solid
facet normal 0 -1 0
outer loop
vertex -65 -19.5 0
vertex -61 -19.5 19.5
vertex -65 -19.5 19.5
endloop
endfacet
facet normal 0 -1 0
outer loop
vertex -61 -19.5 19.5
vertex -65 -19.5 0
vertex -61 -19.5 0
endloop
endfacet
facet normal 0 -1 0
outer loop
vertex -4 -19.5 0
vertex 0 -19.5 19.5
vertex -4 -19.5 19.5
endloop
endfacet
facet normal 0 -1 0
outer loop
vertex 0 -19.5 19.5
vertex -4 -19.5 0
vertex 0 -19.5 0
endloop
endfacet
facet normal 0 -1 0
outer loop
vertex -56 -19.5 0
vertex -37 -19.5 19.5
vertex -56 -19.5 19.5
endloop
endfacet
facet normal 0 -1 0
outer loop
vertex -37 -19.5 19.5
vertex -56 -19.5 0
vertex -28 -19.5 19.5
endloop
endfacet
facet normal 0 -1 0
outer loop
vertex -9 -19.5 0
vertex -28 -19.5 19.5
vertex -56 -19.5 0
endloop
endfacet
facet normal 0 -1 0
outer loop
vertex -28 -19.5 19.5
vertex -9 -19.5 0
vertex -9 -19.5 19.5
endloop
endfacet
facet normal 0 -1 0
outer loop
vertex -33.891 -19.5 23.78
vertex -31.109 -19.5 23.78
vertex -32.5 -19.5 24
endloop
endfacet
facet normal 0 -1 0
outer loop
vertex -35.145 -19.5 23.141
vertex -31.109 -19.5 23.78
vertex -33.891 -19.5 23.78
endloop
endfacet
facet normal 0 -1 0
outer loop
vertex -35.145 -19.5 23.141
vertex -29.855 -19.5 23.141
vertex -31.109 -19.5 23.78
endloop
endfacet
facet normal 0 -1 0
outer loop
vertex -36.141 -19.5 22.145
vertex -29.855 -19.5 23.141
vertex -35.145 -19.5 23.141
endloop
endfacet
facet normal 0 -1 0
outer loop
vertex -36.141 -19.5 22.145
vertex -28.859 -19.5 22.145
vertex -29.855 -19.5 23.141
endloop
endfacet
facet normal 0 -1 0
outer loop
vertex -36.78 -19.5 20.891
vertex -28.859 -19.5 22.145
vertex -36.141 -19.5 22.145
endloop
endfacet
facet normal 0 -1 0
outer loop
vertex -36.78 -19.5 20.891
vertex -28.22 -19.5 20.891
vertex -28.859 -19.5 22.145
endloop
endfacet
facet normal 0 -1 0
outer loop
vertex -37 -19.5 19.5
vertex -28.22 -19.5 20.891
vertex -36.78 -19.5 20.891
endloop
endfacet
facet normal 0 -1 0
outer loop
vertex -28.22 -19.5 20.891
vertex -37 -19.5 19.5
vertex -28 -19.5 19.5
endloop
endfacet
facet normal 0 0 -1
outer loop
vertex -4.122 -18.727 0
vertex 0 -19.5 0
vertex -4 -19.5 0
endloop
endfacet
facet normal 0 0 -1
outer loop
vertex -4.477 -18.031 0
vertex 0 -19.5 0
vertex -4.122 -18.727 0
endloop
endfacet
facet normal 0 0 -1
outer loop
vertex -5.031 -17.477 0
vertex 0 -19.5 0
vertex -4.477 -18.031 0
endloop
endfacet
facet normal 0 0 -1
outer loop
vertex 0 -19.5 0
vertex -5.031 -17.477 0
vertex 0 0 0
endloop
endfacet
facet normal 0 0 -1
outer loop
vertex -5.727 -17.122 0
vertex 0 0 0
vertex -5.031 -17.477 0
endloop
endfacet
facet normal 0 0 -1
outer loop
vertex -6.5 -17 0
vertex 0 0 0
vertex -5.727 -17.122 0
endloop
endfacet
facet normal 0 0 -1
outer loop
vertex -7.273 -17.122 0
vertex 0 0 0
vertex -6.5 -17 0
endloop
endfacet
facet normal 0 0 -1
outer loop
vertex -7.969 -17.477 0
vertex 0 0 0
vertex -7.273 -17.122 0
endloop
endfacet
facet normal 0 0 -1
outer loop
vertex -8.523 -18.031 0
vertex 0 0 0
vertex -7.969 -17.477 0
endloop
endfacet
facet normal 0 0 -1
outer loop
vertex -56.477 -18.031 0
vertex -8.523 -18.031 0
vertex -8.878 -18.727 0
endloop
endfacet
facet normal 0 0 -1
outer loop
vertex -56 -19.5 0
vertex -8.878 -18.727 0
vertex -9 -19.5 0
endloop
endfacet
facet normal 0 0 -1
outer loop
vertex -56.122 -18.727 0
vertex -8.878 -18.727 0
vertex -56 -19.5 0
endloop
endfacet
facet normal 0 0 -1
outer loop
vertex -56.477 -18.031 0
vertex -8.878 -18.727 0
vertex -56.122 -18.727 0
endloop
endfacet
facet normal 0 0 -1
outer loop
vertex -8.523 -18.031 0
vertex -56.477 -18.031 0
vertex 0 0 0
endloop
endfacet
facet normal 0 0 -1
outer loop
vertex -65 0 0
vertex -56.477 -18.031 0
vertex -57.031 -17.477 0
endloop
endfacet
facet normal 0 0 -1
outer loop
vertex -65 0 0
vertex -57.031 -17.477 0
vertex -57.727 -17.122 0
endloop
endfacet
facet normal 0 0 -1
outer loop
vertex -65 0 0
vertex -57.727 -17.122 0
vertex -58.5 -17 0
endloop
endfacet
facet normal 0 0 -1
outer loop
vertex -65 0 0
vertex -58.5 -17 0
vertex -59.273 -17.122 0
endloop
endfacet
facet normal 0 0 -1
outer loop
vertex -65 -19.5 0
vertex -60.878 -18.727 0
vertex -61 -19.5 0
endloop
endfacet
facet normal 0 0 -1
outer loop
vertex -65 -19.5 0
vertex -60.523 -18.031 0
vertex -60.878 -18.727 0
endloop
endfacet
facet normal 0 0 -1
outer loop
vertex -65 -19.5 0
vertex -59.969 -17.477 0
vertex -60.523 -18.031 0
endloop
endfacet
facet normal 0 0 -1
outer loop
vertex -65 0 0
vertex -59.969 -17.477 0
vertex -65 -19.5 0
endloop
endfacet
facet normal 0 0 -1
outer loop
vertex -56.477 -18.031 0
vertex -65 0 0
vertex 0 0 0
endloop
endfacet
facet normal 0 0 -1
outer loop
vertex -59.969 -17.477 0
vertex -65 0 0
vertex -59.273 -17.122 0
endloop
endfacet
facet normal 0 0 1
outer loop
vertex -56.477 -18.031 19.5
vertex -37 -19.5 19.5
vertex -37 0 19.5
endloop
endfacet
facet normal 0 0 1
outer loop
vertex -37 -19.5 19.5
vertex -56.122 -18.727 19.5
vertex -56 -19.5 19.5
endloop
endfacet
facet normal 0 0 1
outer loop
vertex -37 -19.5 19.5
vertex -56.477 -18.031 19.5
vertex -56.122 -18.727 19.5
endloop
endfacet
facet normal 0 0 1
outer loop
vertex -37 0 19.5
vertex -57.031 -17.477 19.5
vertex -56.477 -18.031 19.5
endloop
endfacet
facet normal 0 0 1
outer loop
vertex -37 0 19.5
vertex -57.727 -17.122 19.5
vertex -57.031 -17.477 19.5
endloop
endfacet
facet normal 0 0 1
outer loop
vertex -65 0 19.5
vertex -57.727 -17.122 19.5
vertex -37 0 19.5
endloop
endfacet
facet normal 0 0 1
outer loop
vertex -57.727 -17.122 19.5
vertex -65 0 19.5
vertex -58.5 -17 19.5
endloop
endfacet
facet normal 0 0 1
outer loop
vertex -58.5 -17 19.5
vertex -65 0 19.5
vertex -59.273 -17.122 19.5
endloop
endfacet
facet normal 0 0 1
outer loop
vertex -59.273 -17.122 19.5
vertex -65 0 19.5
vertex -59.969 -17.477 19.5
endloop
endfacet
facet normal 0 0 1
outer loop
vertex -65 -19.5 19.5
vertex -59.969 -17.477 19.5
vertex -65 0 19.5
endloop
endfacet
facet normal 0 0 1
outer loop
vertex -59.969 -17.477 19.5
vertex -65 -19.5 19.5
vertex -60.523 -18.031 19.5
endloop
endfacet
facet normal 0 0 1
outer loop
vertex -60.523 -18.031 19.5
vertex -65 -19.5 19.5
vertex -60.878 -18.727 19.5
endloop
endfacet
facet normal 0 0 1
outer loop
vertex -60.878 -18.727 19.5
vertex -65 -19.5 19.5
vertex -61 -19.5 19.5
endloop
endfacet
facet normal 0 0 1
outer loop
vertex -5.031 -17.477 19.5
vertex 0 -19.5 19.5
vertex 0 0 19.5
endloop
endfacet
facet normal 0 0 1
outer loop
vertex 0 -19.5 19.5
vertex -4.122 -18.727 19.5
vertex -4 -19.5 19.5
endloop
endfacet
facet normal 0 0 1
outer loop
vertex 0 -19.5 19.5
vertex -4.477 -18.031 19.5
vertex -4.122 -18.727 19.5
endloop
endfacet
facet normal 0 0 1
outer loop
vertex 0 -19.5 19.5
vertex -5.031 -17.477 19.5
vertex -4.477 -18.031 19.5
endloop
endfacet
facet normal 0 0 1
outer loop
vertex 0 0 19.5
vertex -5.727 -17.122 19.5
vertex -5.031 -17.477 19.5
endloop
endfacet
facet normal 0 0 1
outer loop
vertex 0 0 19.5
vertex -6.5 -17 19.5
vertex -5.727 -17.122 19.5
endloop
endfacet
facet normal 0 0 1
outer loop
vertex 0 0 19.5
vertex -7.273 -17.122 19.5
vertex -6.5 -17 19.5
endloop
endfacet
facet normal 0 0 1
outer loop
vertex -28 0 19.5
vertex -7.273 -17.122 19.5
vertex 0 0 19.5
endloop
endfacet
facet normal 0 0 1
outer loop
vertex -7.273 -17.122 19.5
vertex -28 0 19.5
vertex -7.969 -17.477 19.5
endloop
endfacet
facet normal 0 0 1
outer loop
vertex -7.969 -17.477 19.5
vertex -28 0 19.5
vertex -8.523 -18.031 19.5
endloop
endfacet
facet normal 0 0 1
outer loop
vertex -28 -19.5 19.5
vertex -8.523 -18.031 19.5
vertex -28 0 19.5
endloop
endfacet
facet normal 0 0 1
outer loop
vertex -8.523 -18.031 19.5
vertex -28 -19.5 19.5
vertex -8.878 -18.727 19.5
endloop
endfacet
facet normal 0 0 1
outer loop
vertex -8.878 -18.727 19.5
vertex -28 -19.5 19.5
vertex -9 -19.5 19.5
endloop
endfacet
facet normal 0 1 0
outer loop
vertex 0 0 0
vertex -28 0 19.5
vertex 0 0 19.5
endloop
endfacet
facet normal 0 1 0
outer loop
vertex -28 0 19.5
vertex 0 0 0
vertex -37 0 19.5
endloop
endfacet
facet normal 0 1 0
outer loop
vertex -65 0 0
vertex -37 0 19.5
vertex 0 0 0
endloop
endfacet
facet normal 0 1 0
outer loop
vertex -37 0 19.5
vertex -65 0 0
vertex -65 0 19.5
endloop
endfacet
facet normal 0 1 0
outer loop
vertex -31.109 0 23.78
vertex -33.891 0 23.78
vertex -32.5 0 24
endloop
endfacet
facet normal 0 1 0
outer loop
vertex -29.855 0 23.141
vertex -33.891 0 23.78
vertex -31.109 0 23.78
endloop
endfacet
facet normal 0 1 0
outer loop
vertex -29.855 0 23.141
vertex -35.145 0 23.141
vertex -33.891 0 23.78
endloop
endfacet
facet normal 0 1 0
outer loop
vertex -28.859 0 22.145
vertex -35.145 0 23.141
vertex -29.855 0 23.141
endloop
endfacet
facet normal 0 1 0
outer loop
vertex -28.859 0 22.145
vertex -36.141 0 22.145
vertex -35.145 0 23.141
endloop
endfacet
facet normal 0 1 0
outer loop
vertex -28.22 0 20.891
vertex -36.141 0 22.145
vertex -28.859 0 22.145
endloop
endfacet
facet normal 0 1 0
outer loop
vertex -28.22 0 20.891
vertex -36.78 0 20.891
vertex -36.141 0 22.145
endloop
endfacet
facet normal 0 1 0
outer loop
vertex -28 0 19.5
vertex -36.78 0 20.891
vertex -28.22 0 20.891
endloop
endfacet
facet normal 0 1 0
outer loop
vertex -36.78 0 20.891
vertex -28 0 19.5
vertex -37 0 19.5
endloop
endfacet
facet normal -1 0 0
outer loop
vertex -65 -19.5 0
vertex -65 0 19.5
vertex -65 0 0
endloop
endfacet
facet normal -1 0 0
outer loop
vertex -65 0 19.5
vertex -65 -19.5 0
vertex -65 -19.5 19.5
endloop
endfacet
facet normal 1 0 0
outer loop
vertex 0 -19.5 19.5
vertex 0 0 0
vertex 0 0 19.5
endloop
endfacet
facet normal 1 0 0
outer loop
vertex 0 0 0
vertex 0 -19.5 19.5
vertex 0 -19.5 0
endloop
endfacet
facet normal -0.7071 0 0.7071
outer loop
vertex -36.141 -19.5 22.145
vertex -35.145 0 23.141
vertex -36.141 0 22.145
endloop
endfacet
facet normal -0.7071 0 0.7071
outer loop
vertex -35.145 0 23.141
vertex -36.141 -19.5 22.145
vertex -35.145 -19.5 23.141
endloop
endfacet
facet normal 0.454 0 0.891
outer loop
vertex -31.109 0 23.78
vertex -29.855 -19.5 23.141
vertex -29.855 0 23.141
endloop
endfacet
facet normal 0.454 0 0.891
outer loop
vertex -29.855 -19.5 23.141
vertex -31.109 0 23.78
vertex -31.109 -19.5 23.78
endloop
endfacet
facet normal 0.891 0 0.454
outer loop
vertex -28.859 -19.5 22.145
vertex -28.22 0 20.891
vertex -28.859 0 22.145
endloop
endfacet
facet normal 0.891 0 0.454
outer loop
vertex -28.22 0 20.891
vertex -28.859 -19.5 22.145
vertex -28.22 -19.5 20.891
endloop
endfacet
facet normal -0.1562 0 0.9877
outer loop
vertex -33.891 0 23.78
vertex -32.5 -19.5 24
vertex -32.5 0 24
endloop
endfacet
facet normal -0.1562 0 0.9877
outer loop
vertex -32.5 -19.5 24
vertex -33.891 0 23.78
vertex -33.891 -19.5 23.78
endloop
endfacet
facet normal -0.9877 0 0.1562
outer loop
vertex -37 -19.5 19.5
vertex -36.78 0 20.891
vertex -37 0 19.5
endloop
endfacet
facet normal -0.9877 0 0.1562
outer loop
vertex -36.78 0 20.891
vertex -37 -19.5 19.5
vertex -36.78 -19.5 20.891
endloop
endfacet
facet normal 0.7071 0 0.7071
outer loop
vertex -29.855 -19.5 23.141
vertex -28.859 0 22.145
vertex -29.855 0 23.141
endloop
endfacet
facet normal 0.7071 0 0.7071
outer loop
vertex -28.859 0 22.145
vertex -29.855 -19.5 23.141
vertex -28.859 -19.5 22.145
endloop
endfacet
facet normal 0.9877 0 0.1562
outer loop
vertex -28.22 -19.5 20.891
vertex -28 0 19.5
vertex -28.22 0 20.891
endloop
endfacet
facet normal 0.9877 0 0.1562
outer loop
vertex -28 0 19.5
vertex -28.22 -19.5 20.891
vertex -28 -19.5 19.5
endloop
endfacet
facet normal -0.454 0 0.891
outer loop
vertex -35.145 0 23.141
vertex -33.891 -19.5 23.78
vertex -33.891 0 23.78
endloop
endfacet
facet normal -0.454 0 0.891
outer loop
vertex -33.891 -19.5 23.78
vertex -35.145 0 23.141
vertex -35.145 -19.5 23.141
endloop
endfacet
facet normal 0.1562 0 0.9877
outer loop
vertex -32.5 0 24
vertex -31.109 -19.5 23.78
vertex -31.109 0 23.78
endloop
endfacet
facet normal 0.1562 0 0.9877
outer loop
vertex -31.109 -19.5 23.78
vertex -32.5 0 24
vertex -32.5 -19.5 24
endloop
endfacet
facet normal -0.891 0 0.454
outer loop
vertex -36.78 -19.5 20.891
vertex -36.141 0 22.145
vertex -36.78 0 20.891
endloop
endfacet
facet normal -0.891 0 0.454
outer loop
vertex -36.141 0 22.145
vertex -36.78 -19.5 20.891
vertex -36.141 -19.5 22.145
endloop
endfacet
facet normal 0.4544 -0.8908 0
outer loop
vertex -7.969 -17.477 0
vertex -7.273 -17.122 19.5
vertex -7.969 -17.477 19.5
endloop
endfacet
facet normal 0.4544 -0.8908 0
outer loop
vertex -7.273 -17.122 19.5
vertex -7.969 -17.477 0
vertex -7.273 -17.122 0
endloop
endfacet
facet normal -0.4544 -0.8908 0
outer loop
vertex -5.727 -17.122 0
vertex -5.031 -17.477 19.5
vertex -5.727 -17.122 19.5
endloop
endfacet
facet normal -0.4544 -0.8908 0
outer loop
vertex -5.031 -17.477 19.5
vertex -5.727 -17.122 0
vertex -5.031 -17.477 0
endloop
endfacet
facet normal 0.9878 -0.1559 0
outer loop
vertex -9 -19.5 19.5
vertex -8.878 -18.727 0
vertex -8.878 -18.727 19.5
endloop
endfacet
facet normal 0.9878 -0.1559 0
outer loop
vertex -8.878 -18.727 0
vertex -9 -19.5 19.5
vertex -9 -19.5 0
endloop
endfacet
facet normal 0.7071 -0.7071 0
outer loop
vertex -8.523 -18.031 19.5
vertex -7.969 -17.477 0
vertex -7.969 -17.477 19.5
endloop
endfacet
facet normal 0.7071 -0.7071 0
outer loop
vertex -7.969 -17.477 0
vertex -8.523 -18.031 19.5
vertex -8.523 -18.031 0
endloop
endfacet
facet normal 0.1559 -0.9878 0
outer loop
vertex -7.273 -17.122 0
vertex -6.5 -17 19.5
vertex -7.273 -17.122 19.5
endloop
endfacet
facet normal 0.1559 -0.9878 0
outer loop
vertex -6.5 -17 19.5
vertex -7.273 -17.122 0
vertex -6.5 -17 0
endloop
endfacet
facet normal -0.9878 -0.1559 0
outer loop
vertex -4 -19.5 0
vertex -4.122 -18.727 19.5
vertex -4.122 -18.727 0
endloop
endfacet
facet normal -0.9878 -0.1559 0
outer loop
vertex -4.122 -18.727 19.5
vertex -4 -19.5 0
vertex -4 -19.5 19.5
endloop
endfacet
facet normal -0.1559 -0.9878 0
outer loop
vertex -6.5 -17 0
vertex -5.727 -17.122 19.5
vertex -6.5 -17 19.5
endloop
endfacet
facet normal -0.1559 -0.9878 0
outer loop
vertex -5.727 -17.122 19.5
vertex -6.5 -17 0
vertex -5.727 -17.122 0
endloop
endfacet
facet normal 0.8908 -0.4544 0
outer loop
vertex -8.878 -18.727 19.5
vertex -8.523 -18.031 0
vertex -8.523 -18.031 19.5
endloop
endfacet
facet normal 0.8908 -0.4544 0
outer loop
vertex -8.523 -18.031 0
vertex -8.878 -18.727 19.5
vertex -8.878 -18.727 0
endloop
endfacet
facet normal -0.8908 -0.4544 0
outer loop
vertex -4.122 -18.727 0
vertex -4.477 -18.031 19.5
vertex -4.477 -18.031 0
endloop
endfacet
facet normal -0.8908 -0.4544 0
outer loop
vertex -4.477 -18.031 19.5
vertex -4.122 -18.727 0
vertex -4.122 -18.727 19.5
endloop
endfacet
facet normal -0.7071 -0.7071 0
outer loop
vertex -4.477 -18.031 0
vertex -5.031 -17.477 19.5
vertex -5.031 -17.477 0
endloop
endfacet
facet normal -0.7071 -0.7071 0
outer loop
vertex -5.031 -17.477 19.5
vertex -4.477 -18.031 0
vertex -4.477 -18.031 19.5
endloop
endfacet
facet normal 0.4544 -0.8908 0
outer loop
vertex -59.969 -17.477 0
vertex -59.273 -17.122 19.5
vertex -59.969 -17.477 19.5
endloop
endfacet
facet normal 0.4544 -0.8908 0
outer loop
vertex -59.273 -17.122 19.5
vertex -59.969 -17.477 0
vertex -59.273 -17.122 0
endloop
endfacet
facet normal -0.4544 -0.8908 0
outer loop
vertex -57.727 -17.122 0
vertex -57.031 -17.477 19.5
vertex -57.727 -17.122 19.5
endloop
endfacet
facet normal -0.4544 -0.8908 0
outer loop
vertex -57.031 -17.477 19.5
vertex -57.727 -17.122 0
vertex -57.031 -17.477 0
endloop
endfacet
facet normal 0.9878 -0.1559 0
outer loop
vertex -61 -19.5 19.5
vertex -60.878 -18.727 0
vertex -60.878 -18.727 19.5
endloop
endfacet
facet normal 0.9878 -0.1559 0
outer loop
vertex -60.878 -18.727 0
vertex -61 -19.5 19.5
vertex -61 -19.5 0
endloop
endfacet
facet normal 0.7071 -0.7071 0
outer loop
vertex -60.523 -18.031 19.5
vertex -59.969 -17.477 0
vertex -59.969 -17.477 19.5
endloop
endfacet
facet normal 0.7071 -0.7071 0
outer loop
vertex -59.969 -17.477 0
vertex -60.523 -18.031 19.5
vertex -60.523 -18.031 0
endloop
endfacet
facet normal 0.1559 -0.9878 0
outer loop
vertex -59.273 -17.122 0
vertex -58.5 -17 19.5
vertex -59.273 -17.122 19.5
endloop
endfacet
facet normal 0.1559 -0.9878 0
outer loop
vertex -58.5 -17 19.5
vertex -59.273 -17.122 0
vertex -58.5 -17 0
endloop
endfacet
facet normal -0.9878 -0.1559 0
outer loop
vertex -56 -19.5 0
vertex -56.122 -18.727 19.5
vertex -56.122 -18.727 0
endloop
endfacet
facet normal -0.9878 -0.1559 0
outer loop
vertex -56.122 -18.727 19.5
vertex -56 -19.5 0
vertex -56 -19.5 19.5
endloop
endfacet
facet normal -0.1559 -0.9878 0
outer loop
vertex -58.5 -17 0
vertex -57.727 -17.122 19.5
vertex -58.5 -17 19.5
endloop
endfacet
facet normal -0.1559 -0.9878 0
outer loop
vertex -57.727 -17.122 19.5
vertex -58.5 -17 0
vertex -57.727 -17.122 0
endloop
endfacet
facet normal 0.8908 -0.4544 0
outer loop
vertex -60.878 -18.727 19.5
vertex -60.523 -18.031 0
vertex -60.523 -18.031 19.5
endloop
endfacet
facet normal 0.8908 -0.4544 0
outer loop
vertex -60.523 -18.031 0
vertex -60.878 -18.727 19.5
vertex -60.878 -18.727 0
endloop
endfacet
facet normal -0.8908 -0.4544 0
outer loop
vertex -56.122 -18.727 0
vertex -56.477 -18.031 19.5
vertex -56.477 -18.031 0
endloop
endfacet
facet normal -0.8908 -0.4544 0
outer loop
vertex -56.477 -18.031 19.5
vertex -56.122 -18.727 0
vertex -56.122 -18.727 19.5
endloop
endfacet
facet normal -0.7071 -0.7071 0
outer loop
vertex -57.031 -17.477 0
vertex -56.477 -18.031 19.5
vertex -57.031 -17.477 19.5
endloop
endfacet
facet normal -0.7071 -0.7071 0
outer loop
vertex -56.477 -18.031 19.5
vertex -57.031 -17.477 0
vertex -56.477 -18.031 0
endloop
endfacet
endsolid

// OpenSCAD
// file: barrel.scad
$fn = 20;

/*
 * These values are measured for our darts set etc
 */
electromagnet_radius = 20 + 1; // 2 cm + 1 mm
electromagnet_height = 27 + 1; // 2.7 cm
elastic_radius = 2.5; // 2.5 mm
flight_radius = 17.5 + 2; // 1.75 cm + 2 mm
shaft_radius = 4 + 1; // 4 mm + 1 mm
dart_length = 150; // 15 cm
flight_depth = 2; // 2 mm

padding = 10; // 1 cm
back_padding = electromagnet_height + 5;
device_length = 200; // 20 cm

sled_width = flight_radius; // Equal to the flight radius.
sled_height = 10; // 1 cm
sled_padding = (2 * elastic_radius) + 8; // Space between for structural integrity
sled_depth = (flight_radius * 2) + (sled_padding * 2);
sled_cutout_radius = shaft_radius - .5; // Subtract a bit from the structure so we can actually slide.

pin_depth = 5; // 5 mm

roof_height = 5;

module sled() {
    // Sled on the top of the barrel
    translate([0, 0, sled_height])
        rotate([0, 180, 0])
            difference() {
                union() {
                    cube([sled_width, sled_depth, flight_radius]);
                    translate([0, sled_depth / 2, 0])
                        rotate([0, 90, 0])
                            cylinder(r = sled_cutout_radius, h = sled_width);
                }

                translate([sled_width, elastic_radius + 4, 0])
                    cylinder(r = elastic_radius, h = sled_width);

                translate([sled_width, sled_depth - elastic_radius - 4, 0])
                    cylinder(r = elastic_radius, h = sled_width);
            }
}

module roof() {
    difference() {
        union() {
            cube([device_length, flight_radius * 2, roof_height]);

            rotate([180, 0, 0])
                translate([device_length, - sled_depth + sled_padding, - padding - flight_radius * 2 - roof_height])
                    back(true);

            translate([0, - sled_padding, 0])
                cube([sled_height * 2, sled_depth, roof_height]);
        }

        translate([0, - elastic_radius - 4, roof_height])
            rotate([0, 90, 0])
                cylinder(r = elastic_radius, h = sled_height * 2);

        translate([0, sled_depth - sled_padding - elastic_radius - 4, roof_height])
            rotate([0, 90, 0])
                cylinder(r = elastic_radius, h = sled_height * 2);
    }
}

module back(isTop) {
    difference() {
        // Guard on the back
        translate([- 5, 0, 0])
            cube([back_padding + 5, sled_depth, padding + flight_radius + flight_radius + roof_height]);



        if (isTop == false) {
            // Electromagnet cutout
            rotate([0, 90, 0])
                translate([- padding - flight_radius, sled_padding + flight_radius, 0])
                    cylinder(r = electromagnet_radius, h = electromagnet_height);

            // Cut off the top
            translate([- 5, 0, padding + flight_radius])
                cube([back_padding + 5, sled_depth, flight_radius + roof_height]);

            // Left pin
            translate([back_padding / 2, sled_padding / 2, padding + flight_radius - pin_depth])
                cylinder(r = elastic_radius, h = pin_depth);

            // Right pin
            translate([back_padding / 2,
                        sled_padding + flight_radius * 2 + sled_padding / 2,
                        padding + flight_radius - pin_depth])
                cylinder(r = elastic_radius, h = pin_depth);
        } else {
            // Electromagnet cutout
            rotate([0, 90, 0])
                translate([- padding - flight_radius, sled_padding + flight_radius, -5])
                    cylinder(r = electromagnet_radius, h = electromagnet_height + 5);
            // Cut off the bottom
            translate([- 5, 0, 0])
                cube([back_padding + 5, sled_depth, padding + flight_radius]);
        }
    }

    if (isTop == true) {
        // Left pin
        translate([back_padding / 2, sled_padding / 2, padding + flight_radius - pin_depth])
            cylinder(r = elastic_radius - 1, h = pin_depth);

        // Right pin
        translate([back_padding / 2,
                    sled_padding + flight_radius * 2 + sled_padding / 2,
                    padding + flight_radius - pin_depth])
            cylinder(r = elastic_radius - 1, h = pin_depth);
    }
}

module barrel() {
    difference() {
        union() {
            // Dart barrel
            cube([device_length, flight_radius * 2, flight_radius + padding]);

            // Sled on the front of the barrel for holding the elastic band
            translate([sled_height, - sled_padding, flight_radius + padding + sled_width])
                rotate([0, 180, 0])
                    difference() {
                        // Pillar cube
                        translate([- sled_height, 0, 0])
                            cube([sled_height * 2, sled_depth, flight_radius + padding + sled_width]);

                        // Gap between pillars
                        translate([- sled_height, sled_padding, 0])
                            cube([sled_height * 2, flight_radius * 2, sled_width]);

                        // Right cutout
                        translate([sled_height, elastic_radius + 4, 0])
                            cylinder(r = elastic_radius, h = flight_radius + padding + sled_width);

                        // Top right cutout
                        translate([- sled_height, elastic_radius + 4, 0])
                            rotate([0, 90, 0])
                                cylinder(r = elastic_radius, h = sled_width);

                        // Left cutout
                        translate([sled_height, sled_depth - elastic_radius - 4, 0])
                            cylinder(r = elastic_radius, h = flight_radius + padding + sled_width);

                        // Top left cutout
                        translate([- sled_height, sled_depth - elastic_radius - 4, 0])
                            rotate([0, 90, 0])
                                cylinder(r = elastic_radius, h = sled_width);
                    }

            translate([device_length, - sled_padding, 0])
                back(false);
        }

        // Shaft cutout
        rotate([0, 90, 0])
            translate([- flight_radius - padding, flight_radius, 0])
                cylinder(r = shaft_radius, h = device_length);

        // Flight cutout
        translate([0, flight_radius - (flight_depth / 2), padding])
            cube([device_length, flight_depth, flight_radius + 1]);
    }
}

module electromagnet() {
    translate([0, electromagnet_radius, electromagnet_radius])
        rotate([0, 90, 0])
            cylinder(r = electromagnet_radius, h = electromagnet_height);
}

translate([0, - 150])
    barrel();

roof();

translate([90, 80, 9.5])
    rotate([0, 0, 90])
        sled();
// main file
use <barrel.scad>;

translate([0, 0, 9.5])
    rotate([0, 0, 90])
        sled();
